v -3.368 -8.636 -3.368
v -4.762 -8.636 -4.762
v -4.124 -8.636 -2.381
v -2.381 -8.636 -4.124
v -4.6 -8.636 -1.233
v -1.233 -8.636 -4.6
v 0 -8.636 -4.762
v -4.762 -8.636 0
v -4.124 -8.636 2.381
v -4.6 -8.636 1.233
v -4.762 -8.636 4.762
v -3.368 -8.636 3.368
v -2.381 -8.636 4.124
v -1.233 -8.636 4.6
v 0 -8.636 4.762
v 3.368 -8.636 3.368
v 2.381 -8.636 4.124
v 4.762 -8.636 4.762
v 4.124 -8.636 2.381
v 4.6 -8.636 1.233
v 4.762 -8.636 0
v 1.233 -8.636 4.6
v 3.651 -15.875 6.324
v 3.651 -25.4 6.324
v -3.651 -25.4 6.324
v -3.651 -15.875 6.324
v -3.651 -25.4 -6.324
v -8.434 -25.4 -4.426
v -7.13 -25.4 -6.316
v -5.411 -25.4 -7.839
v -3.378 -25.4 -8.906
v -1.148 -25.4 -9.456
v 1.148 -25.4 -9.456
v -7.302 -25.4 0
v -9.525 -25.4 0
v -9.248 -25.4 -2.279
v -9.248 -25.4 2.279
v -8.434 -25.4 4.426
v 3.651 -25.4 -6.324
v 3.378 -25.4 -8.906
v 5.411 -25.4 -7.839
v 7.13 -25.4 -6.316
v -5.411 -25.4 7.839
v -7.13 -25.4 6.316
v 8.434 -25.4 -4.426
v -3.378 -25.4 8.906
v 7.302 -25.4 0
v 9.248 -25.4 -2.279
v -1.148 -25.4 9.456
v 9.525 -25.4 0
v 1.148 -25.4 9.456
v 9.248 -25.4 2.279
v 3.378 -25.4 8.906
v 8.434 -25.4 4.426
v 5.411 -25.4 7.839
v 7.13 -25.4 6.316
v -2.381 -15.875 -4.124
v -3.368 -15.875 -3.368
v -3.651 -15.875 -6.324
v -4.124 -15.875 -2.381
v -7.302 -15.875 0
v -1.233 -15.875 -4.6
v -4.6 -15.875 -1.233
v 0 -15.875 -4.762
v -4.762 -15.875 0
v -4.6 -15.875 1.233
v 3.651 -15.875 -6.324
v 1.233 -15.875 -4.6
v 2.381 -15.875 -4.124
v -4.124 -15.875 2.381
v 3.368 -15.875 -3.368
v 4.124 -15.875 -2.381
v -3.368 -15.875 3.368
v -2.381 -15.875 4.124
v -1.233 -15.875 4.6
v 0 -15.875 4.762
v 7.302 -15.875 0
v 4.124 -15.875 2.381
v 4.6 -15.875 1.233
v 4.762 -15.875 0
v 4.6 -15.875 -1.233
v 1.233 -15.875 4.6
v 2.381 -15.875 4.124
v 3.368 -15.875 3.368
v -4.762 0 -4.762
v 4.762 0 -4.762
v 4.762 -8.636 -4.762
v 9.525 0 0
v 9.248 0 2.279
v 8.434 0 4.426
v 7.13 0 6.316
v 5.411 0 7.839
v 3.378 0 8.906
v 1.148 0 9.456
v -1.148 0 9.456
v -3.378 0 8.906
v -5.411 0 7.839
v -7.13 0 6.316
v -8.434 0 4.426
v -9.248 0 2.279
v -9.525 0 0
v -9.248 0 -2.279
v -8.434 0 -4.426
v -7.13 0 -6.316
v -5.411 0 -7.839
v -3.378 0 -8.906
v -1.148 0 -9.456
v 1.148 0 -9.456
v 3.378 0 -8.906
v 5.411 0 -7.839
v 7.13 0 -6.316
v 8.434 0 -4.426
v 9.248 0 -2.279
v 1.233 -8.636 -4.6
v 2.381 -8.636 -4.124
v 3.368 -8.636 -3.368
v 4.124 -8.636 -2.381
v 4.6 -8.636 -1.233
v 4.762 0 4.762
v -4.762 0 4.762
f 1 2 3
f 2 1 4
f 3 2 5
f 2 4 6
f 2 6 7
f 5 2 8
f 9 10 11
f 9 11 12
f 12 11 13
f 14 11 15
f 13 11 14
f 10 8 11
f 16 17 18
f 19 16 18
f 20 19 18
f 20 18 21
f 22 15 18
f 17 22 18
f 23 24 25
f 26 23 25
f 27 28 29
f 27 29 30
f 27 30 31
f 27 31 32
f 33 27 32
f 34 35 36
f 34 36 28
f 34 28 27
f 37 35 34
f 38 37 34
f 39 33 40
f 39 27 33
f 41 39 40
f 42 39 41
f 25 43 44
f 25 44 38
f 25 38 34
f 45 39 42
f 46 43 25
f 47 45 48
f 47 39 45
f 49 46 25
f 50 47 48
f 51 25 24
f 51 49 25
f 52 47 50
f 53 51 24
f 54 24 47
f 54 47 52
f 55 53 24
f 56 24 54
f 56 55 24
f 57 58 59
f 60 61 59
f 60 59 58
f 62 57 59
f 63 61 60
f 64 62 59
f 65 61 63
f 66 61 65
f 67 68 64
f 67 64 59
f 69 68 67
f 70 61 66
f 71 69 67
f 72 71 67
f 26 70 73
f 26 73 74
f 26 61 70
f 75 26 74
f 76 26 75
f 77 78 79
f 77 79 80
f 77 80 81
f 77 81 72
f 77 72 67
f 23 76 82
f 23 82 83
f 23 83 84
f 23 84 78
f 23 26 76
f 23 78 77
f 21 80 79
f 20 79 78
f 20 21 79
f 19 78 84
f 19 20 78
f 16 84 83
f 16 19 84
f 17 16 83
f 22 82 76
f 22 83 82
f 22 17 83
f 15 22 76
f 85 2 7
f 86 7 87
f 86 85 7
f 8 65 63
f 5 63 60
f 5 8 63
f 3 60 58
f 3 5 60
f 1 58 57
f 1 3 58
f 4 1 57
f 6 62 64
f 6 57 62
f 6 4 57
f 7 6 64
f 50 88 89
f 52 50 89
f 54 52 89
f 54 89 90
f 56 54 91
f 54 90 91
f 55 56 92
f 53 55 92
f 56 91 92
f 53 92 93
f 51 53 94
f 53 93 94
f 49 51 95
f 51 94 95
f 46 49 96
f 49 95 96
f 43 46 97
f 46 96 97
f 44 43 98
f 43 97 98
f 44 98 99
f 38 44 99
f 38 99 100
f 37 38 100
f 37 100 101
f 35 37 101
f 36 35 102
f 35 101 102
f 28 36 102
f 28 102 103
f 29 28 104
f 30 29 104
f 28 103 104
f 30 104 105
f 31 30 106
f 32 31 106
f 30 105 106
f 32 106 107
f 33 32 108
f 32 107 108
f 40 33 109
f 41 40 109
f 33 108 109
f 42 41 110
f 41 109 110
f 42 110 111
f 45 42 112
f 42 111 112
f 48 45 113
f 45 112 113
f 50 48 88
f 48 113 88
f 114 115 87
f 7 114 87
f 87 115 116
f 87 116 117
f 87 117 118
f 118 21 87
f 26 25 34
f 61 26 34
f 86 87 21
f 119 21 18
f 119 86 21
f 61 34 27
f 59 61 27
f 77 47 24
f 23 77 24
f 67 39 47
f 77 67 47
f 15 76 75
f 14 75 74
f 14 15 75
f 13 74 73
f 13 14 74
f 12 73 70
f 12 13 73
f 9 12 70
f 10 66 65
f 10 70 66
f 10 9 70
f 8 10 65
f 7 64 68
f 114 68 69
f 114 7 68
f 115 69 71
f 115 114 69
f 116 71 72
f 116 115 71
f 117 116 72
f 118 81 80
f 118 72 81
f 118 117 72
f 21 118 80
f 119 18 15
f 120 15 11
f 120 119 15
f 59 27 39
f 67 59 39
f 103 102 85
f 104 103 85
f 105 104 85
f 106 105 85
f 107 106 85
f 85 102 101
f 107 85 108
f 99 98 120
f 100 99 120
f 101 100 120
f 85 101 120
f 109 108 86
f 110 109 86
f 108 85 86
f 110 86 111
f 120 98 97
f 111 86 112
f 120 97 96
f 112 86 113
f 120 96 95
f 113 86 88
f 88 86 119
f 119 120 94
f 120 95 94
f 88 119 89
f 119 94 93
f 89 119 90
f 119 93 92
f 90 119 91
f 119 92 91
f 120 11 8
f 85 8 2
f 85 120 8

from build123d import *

# Parameters (mm, degrees)
F0_R     = 9.525
F1_DEPTH = 25.4
F3_DEPTH = 25.401
F4_DEPTH = 8.636
F6_DEPTH = 9.525


with BuildPart() as f1:
    # F0 (on Front) → F1 (new body)
    with BuildSketch(Plane.XZ):
        Circle(F0_R)
    extrude(amount=F1_DEPTH)

    # F2 (on Front) → F3 (cut, through all)
    with BuildSketch(Plane.XZ):
        with BuildLine():
            ThreePointArc((4.7625, 0), (3.367596, 3.367596), (0, 4.7625))
            ThreePointArc((0, 4.7625), (-3.367596, 3.367596), (-4.7625, 0))
            ThreePointArc((-4.7625, 0), (-3.367596, -3.367596), (0, -4.7625))
            ThreePointArc((0, -4.7625), (3.367596, -3.367596), (4.7625, 0))
        make_face()
    extrude(amount=F3_DEPTH, mode=Mode.SUBTRACT)

    # F2 (on Front) → F4 (cut)
    with BuildSketch(Plane.XZ):
        with BuildLine():
            ThreePointArc((-4.7625, 0), (-3.367596, 3.367596), (0, 4.7625))
            Line((0, 4.7625), (-4.7625, 4.7625))
            Line((-4.7625, 4.7625), (-4.7625, 0))
        make_face()
        with BuildLine():
            Line((4.7625, 0), (4.7625, 4.7625))
            Line((4.7625, 4.7625), (0, 4.7625))
            ThreePointArc((0, 4.7625), (3.367596, 3.367596), (4.7625, 0))
        make_face()
        with BuildLine():
            ThreePointArc((0, -4.7625), (-3.367596, -3.367596), (-4.7625, 0))
            Line((-4.7625, 0), (-4.7625, -4.7625))
            Line((-4.7625, -4.7625), (0, -4.7625))
        make_face()
        with BuildLine():
            Line((4.7625, -4.7625), (4.7625, 0))
            ThreePointArc((4.7625, 0), (3.367596, -3.367596), (0, -4.7625))
            Line((0, -4.7625), (4.7625, -4.7625))
        make_face()
    extrude(amount=F4_DEPTH, mode=Mode.SUBTRACT)

    # F5 (on face) → F6 (cut)
    with BuildSketch(Plane.XZ.offset(25.4)):
        Polygon((3.65125, 6.324151), (-3.65125, 6.324151), (-7.3025, 0), (-3.65125, -6.324151), (3.65125, -6.324151), (7.3025, 0), align=None)
    extrude(amount=-F6_DEPTH, mode=Mode.SUBTRACT)


solid = f1.part
